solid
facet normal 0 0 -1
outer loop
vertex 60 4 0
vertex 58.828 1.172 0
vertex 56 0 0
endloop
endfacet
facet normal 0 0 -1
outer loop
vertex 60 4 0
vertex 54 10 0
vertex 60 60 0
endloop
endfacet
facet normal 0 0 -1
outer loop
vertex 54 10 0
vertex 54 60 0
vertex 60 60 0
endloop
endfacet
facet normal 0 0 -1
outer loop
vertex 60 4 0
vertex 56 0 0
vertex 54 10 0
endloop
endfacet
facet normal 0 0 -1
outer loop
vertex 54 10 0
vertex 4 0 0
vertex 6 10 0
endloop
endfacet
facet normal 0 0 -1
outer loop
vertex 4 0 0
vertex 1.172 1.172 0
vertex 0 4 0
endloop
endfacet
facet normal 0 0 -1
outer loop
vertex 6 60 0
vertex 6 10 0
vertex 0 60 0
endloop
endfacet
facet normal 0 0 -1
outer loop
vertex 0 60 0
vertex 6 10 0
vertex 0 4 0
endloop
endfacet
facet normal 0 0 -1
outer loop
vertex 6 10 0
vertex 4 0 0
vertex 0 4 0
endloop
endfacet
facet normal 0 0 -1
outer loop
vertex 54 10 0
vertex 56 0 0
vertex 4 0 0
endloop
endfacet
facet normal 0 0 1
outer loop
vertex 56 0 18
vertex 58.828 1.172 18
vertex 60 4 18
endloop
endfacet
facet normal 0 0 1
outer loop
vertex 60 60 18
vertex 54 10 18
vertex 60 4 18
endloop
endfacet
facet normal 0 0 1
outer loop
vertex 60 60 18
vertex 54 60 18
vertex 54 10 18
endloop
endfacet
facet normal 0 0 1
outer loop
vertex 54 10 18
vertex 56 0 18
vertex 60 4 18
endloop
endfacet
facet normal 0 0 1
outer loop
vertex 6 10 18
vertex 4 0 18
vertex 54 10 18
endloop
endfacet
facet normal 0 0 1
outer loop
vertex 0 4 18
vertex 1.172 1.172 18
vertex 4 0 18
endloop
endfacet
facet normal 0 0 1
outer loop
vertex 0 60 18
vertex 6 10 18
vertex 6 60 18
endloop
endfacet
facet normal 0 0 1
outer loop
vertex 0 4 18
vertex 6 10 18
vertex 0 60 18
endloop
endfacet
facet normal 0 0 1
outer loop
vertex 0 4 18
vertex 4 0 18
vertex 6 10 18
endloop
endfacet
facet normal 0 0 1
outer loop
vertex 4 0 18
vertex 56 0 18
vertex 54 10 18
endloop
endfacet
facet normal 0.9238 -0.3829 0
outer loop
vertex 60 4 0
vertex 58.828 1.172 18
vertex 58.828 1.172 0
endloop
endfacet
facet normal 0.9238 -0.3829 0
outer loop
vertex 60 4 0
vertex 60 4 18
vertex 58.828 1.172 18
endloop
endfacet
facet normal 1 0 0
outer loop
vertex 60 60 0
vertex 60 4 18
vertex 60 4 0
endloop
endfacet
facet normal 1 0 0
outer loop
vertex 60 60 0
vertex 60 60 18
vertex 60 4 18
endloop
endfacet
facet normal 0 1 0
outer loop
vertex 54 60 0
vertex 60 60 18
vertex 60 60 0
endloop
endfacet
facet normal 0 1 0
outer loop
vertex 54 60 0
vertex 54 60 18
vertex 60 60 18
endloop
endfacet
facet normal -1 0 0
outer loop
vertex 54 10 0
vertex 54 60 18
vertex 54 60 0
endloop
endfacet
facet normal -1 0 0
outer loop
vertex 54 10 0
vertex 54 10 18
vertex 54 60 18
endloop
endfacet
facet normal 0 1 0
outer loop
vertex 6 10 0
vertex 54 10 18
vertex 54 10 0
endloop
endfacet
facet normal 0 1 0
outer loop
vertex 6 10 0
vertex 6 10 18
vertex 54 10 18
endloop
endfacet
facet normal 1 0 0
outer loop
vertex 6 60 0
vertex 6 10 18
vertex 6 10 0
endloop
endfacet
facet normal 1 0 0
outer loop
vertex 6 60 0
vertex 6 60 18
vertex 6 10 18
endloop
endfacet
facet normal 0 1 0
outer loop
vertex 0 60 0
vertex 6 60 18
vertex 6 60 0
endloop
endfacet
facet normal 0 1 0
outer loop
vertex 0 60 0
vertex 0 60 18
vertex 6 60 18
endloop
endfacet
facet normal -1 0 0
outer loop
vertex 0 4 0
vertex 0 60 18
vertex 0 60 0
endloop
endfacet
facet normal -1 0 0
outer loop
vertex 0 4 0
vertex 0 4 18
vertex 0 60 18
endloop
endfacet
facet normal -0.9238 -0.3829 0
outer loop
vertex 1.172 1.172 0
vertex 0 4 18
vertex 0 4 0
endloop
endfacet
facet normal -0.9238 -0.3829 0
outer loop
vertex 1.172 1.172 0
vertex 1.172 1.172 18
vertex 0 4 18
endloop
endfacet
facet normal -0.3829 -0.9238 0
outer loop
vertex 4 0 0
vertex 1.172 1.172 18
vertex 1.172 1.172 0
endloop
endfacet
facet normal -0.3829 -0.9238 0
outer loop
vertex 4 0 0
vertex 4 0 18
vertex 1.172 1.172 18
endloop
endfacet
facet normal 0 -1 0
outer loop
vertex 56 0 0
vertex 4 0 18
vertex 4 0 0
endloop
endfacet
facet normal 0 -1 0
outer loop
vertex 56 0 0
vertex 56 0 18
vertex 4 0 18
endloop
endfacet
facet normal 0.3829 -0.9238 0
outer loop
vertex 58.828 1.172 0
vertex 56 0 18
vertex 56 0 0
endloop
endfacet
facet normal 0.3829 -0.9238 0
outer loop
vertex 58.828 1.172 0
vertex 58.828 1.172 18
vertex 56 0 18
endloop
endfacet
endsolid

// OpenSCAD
$fn = 32;

// ----------------------------------------------------------------------
// Heat sink frame: 60 x 60 mm frame, 6 mm walls
// ----------------------------------------------------------------------

// --- parameters (mm) ---
profile_height = 18;      // extrusion height
profile_points = 12;      // points of the closed outline

profile = [[0, 4], [1.172, 1.172], [4, 0], [56, 0], [58.828, 1.172], [60, 4], [60, 60], [54, 60], [54, 10], [6, 10], [6, 60], [0, 60]];  // single closed polygon, 12 points, counter clockwise

// --- the one profile operation ---
linear_extrude(height = profile_height) polygon(points = profile);
